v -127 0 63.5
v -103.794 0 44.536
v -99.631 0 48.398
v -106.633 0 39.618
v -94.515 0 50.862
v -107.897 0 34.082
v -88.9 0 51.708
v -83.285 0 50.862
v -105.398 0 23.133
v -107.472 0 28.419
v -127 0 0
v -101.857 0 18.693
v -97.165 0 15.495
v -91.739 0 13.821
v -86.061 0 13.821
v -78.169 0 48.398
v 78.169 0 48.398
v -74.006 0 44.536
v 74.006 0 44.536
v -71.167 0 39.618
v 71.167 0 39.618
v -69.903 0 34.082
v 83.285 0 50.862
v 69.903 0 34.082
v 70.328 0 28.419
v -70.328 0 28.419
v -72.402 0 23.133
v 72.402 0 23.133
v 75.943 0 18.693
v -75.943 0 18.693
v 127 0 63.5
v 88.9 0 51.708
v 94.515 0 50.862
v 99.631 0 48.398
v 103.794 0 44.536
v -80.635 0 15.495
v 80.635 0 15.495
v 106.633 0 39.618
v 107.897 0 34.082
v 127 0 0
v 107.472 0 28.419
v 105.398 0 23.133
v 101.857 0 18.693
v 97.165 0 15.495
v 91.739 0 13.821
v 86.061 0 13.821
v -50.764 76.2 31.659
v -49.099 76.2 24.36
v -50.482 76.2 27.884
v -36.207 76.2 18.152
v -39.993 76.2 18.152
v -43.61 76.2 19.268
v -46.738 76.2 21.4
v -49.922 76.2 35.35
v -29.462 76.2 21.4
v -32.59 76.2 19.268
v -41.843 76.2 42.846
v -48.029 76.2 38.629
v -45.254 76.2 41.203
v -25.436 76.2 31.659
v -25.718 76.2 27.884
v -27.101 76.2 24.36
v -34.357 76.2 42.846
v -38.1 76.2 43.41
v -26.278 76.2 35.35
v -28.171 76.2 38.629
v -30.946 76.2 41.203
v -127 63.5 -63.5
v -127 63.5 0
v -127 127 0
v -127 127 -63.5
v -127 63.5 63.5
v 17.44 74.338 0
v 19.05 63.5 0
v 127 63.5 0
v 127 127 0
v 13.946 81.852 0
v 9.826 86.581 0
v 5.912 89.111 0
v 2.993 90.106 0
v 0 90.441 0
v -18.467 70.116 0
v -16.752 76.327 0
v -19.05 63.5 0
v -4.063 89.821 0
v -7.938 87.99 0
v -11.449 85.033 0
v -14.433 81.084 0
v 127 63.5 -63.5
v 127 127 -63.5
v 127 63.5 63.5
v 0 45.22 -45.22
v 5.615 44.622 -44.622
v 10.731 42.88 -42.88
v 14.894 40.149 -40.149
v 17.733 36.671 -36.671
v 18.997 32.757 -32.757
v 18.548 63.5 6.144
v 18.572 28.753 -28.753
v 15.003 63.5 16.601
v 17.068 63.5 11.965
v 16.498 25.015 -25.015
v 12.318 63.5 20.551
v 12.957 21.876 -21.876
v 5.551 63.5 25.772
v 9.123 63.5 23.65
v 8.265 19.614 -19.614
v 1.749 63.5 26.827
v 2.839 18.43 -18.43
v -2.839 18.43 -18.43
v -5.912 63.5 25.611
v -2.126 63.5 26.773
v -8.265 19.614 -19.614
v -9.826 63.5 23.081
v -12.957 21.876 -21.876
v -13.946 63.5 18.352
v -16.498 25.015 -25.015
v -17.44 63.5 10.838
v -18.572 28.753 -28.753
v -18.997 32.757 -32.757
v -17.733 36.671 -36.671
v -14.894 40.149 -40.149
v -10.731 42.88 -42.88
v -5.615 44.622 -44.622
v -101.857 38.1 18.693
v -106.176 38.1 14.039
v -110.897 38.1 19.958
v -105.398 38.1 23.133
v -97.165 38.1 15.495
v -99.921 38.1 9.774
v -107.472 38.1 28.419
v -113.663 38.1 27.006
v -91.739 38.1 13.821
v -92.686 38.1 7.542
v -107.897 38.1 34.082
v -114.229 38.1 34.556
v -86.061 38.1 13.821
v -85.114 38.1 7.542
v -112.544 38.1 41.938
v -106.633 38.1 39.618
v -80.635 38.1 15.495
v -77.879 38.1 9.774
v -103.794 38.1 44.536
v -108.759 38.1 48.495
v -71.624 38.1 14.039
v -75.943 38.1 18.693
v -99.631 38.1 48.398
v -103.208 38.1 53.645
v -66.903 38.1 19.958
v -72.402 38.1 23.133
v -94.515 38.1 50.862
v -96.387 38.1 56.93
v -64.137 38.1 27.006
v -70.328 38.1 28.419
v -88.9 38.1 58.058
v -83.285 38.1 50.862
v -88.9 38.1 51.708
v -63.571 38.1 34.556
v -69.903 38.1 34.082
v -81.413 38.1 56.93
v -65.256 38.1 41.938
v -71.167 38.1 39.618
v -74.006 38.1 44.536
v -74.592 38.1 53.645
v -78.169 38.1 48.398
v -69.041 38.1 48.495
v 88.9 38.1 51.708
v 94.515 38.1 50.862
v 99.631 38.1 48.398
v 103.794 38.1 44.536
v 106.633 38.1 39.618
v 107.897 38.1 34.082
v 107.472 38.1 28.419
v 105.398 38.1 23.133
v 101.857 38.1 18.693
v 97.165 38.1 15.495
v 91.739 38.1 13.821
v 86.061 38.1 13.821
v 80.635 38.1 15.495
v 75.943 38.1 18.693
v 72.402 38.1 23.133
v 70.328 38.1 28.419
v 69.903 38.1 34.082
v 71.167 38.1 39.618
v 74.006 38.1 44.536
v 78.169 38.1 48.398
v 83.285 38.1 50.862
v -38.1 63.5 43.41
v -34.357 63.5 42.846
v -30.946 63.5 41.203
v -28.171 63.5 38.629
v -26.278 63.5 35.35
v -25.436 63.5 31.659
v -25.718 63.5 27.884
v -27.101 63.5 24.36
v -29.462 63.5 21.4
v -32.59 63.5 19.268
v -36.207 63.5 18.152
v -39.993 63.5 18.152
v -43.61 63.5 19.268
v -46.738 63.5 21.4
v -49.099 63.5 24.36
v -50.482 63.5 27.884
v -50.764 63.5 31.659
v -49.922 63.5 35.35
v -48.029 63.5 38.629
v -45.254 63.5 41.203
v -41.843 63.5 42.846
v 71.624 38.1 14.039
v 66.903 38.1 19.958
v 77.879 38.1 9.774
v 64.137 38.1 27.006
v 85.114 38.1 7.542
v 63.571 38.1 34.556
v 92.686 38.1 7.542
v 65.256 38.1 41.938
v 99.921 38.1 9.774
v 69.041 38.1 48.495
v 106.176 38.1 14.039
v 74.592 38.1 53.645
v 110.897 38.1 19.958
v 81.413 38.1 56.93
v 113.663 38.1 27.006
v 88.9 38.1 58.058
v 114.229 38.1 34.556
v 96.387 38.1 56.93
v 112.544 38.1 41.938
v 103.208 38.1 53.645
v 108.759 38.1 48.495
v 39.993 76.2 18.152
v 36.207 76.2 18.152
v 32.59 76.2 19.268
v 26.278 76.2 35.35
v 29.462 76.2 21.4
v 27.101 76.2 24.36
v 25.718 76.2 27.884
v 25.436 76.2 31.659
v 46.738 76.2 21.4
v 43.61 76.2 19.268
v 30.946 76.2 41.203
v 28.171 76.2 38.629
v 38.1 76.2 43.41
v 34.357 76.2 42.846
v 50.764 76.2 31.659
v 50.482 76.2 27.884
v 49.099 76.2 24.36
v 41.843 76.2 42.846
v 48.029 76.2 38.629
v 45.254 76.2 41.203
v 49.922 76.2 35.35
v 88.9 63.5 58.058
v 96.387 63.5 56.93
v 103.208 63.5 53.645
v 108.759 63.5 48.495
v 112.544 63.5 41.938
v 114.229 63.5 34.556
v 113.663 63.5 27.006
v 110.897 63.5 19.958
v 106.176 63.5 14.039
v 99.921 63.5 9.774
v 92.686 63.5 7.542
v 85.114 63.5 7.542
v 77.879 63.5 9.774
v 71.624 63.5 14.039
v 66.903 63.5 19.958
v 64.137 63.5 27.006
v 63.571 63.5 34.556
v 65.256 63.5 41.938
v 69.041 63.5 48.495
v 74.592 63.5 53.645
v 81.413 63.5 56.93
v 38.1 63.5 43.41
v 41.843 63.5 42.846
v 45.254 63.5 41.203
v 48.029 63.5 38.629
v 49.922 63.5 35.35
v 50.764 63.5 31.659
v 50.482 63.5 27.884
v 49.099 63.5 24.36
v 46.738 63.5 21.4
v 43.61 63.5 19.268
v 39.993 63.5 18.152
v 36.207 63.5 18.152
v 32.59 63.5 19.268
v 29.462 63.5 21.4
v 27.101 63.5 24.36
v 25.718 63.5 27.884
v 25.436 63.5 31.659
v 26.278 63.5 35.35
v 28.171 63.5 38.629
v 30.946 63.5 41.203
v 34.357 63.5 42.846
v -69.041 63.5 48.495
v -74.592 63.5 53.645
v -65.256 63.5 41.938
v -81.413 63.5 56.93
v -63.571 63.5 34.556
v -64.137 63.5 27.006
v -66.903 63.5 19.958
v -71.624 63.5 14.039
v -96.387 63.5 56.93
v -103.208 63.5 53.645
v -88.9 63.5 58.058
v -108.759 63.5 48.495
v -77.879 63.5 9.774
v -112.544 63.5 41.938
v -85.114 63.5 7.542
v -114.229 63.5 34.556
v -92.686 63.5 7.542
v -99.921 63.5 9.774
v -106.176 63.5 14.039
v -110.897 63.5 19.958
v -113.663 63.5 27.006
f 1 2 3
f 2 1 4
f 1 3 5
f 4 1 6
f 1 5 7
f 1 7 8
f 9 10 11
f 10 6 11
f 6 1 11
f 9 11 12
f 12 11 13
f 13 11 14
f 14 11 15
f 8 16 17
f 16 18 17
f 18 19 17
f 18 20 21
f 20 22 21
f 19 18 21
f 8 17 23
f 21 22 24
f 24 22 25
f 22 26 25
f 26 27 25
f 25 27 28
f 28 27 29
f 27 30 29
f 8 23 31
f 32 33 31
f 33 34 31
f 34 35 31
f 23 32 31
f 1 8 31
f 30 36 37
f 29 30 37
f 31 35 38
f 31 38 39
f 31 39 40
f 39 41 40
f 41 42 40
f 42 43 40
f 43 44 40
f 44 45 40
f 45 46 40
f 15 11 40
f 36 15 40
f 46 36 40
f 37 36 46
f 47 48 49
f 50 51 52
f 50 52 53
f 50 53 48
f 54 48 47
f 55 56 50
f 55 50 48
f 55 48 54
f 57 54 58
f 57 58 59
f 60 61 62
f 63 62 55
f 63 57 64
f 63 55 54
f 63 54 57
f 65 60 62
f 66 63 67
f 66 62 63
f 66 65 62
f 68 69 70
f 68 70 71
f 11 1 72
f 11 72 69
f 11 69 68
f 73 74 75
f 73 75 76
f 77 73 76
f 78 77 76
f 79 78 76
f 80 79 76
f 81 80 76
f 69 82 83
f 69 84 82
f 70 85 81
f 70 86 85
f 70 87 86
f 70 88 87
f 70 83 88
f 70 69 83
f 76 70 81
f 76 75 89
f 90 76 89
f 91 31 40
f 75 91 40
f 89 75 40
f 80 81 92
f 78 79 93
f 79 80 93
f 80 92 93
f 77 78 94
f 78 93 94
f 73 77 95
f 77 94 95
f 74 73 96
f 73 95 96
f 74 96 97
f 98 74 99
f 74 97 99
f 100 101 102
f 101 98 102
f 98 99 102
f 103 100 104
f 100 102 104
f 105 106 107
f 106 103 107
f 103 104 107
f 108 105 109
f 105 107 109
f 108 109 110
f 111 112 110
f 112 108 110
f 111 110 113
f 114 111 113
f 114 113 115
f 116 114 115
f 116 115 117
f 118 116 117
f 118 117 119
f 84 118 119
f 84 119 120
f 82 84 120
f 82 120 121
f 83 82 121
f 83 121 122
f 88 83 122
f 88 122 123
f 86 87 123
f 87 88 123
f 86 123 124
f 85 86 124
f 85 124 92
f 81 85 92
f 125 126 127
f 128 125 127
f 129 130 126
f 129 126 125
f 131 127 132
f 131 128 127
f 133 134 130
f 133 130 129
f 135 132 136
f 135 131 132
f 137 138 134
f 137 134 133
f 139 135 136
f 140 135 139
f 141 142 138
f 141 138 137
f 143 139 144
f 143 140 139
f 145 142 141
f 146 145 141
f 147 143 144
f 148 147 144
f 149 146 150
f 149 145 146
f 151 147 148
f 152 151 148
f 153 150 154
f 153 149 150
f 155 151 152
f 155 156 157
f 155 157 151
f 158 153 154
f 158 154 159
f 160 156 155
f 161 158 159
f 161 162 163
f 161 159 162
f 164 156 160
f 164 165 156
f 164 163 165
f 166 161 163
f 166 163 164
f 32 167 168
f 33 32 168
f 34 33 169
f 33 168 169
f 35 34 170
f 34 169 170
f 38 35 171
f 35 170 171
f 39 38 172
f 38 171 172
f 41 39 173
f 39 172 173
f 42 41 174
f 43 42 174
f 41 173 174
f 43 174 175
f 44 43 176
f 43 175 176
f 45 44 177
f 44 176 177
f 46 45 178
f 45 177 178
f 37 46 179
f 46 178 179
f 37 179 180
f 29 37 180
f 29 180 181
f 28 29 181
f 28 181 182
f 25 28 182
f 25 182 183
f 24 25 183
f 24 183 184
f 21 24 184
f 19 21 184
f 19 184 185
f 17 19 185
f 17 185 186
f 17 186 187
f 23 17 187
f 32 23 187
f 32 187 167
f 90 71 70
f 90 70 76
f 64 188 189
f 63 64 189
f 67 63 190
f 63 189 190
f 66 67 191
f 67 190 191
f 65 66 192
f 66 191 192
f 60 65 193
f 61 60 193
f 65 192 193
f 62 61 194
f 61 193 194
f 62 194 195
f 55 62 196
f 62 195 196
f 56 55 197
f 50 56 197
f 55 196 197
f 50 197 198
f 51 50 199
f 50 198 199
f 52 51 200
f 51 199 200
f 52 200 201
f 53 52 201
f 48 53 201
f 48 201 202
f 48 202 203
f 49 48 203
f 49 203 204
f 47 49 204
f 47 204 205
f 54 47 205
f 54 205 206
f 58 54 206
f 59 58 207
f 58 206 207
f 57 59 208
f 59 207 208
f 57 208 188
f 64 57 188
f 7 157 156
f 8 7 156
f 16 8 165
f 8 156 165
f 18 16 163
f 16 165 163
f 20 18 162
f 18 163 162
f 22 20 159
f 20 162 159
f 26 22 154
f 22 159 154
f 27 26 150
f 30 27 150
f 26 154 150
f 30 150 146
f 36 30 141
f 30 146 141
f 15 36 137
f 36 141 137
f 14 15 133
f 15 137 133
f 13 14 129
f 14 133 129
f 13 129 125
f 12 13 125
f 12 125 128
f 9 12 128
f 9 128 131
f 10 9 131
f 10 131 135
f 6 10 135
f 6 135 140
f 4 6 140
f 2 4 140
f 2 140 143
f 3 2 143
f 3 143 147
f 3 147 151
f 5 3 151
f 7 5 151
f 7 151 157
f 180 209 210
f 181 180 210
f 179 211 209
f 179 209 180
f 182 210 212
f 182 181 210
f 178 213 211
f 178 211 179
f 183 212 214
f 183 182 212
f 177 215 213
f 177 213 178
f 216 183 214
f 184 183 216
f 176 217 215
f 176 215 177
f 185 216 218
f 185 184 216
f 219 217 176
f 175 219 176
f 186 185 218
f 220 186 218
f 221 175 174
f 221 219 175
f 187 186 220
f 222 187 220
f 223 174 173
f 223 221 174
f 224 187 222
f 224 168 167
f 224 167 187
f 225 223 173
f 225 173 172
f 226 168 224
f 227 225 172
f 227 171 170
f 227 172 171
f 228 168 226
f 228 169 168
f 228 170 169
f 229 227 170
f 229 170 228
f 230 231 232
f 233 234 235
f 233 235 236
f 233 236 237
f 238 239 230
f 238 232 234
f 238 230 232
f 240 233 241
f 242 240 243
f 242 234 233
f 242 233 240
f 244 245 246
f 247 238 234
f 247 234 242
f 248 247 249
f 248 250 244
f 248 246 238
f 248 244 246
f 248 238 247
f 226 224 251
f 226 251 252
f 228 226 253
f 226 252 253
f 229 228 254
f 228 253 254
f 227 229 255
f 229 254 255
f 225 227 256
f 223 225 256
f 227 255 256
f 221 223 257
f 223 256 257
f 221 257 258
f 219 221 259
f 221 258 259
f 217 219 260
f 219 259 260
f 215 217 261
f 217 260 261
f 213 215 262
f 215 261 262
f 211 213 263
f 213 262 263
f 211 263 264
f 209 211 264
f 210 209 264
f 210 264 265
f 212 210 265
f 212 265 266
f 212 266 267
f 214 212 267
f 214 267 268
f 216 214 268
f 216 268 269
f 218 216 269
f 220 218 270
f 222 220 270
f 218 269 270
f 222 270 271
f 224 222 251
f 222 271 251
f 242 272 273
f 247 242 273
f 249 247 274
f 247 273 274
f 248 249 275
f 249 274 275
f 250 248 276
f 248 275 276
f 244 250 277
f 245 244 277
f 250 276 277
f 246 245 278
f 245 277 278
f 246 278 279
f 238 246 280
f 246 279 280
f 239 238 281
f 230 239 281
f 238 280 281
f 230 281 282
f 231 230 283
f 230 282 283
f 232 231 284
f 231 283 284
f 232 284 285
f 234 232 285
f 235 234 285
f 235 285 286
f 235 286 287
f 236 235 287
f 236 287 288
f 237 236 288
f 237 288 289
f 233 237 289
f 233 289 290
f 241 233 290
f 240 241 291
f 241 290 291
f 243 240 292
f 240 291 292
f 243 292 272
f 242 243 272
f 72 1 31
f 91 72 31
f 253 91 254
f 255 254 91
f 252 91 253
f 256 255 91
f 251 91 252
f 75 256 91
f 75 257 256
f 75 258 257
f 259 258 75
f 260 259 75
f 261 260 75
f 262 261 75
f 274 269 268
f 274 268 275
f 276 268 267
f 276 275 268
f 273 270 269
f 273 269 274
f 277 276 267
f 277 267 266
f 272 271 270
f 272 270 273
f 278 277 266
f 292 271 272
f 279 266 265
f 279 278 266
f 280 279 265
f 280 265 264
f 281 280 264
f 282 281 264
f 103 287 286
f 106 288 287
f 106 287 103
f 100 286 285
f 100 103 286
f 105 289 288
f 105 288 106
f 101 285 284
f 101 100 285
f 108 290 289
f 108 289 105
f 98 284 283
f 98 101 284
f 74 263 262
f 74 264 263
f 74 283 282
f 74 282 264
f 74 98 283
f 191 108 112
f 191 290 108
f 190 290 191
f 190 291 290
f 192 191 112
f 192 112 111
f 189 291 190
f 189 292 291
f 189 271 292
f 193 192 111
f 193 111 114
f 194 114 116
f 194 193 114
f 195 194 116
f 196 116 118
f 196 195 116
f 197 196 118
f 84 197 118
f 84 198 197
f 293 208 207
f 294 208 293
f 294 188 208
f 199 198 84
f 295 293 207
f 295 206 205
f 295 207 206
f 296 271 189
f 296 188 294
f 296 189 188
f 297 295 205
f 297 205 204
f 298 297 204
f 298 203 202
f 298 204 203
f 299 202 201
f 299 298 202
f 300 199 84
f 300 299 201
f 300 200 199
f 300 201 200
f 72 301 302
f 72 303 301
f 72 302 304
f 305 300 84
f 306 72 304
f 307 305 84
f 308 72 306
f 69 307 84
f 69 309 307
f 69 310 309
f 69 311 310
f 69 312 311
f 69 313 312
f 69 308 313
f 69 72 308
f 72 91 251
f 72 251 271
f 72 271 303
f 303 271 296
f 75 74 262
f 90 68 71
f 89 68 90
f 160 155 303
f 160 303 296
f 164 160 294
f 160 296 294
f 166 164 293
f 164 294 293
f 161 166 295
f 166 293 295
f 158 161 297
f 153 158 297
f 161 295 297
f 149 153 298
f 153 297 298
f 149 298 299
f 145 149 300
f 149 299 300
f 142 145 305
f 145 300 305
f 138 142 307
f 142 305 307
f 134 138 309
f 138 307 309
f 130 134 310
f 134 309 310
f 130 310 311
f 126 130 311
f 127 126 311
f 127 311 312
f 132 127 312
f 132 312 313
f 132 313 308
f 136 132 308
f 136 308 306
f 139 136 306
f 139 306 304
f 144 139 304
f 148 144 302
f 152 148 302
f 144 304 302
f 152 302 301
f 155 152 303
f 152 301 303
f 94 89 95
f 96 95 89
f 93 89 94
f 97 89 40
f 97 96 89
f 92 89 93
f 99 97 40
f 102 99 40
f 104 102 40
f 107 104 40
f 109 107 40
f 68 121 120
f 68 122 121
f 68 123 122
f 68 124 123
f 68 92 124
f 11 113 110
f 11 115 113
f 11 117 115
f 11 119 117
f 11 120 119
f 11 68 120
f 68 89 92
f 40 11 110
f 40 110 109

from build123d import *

# Parameters (mm, degrees)
SKETCH1_W                      = 254
SKETCH1_H                      = 127
RECTANGLE_PRISON_DEPTH         = 127
TOP_SQUARE_CUT_DEPTH           = 291.99355663
TOP_SQUARE_CUT_DEPTH_BACK      = 291.99355663
BUTTOM_TRI_CUT_DEPTH           = 291.99355663
BUTTOM_TRI_CUT_DEPTH_BACK      = 291.99355663
SKETCH8_R                      = 25.4
OUTER_CIRCLE_CUT_DEPTH         = 25.4
SKETCH9_R                      = 19.05
INNER_CIRCLE_CUT_DEPTH         = 168.52450567
SKETCH11_R                     = 12.7
TWO_CIRCLES_OUT_DEPTH          = 12.7
SKETCH12_R                     = 19.05
CIRCLE_CUT_IN_THE_MIDDLE_DEPTH = 191.5


with BuildPart() as part:
    # Sketch1 → Rectangle prison (new body)
    with BuildSketch(Plane(origin=(0, 0, 0), x_dir=(1, 0, 0), z_dir=(0, 1, 0))):
        Rectangle(SKETCH1_W, SKETCH1_H)
    extrude(amount=RECTANGLE_PRISON_DEPTH)

    # Sketch6 → Top square cut (cut, two sides: drawn at the far end of the back side and taken through both)
    with BuildSketch(Plane(origin=(127, 0, 0), x_dir=(0, 0, -1), z_dir=(1, 0, 0)).offset(-TOP_SQUARE_CUT_DEPTH_BACK)):
        Polygon((-357.480633142, 63.5), (-63.5, 63.5), (0, 63.5), (0, 127), (0, 420.980633142), (-415.751398465, 836.732031608), (-773.232031608, 479.251398465), align=None)
    extrude(amount=TOP_SQUARE_CUT_DEPTH + TOP_SQUARE_CUT_DEPTH_BACK, mode=Mode.SUBTRACT)

    # Sketch7 → Buttom tri cut (cut, two sides: drawn at the far end of the back side and taken through both)
    with BuildSketch(Plane(origin=(127, 0, 0), x_dir=(0, 0, -1), z_dir=(1, 0, 0)).offset(-BUTTOM_TRI_CUT_DEPTH_BACK)):
        Polygon((-207.875699233, -207.875699233), (0, 0), (63.5, 63.5), (271.375699233, 271.375699233), (687.127097698, -144.375699233), (207.875699233, -623.627097698), align=None)
    extrude(amount=BUTTOM_TRI_CUT_DEPTH + BUTTOM_TRI_CUT_DEPTH_BACK, mode=Mode.SUBTRACT)

    # Sketch8 → outer circle cut (cut)
    with BuildSketch(Plane(origin=(0, 63.5, 0), x_dir=(1, 0, 0), z_dir=(0, 1, 0))):
        with Locations(Location((-88.9, -32.658118373, 0), (0, 0, 270))):
            Circle(SKETCH8_R)
        with Locations(Location((88.9, -32.658118373, 0), (0, 0, 270))):
            Circle(SKETCH8_R)
    extrude(amount=-OUTER_CIRCLE_CUT_DEPTH, mode=Mode.SUBTRACT)

    # Sketch9 → inner circle cut (cut, through all)
    with BuildSketch(Plane(origin=(0, 38.1, 0), x_dir=(1, 0, 0), z_dir=(0, 1, 0))):
        with Locations(Location((-88.9, -32.658118373, 0), (0, 0, 270))):
            Circle(SKETCH9_R)
        with Locations(Location((88.9, -32.658118373, 0), (0, 0, 270))):
            Circle(SKETCH9_R)
    extrude(amount=-INNER_CIRCLE_CUT_DEPTH, mode=Mode.SUBTRACT)

    # Sketch11 → Two circles out (add)
    with BuildSketch(Plane(origin=(0, 63.5, 0), x_dir=(1, 0, 0), z_dir=(0, 1, 0))):
        with Locations(Location((-38.1, -30.71024924, 0), (0, 0, 270))):
            Circle(SKETCH11_R)
        with Locations(Location((38.1, -30.71024924, 0), (0, 0, 270))):
            Circle(SKETCH11_R)
    extrude(amount=TWO_CIRCLES_OUT_DEPTH)

    # Sketch12 → Circle cut in the middle (cut, through all)
    with BuildSketch(Plane(origin=(0, 0, 0), x_dir=(1, 0, 0), z_dir=(0, -0.7071067811865475, -0.7071067811865476))):
        with Locations(Location((0, -44.901280605, 0), (0, 0, 270))):
            Circle(SKETCH12_R)
    extrude(amount=-CIRCLE_CUT_IN_THE_MIDDLE_DEPTH, mode=Mode.SUBTRACT)


solid = part.part
